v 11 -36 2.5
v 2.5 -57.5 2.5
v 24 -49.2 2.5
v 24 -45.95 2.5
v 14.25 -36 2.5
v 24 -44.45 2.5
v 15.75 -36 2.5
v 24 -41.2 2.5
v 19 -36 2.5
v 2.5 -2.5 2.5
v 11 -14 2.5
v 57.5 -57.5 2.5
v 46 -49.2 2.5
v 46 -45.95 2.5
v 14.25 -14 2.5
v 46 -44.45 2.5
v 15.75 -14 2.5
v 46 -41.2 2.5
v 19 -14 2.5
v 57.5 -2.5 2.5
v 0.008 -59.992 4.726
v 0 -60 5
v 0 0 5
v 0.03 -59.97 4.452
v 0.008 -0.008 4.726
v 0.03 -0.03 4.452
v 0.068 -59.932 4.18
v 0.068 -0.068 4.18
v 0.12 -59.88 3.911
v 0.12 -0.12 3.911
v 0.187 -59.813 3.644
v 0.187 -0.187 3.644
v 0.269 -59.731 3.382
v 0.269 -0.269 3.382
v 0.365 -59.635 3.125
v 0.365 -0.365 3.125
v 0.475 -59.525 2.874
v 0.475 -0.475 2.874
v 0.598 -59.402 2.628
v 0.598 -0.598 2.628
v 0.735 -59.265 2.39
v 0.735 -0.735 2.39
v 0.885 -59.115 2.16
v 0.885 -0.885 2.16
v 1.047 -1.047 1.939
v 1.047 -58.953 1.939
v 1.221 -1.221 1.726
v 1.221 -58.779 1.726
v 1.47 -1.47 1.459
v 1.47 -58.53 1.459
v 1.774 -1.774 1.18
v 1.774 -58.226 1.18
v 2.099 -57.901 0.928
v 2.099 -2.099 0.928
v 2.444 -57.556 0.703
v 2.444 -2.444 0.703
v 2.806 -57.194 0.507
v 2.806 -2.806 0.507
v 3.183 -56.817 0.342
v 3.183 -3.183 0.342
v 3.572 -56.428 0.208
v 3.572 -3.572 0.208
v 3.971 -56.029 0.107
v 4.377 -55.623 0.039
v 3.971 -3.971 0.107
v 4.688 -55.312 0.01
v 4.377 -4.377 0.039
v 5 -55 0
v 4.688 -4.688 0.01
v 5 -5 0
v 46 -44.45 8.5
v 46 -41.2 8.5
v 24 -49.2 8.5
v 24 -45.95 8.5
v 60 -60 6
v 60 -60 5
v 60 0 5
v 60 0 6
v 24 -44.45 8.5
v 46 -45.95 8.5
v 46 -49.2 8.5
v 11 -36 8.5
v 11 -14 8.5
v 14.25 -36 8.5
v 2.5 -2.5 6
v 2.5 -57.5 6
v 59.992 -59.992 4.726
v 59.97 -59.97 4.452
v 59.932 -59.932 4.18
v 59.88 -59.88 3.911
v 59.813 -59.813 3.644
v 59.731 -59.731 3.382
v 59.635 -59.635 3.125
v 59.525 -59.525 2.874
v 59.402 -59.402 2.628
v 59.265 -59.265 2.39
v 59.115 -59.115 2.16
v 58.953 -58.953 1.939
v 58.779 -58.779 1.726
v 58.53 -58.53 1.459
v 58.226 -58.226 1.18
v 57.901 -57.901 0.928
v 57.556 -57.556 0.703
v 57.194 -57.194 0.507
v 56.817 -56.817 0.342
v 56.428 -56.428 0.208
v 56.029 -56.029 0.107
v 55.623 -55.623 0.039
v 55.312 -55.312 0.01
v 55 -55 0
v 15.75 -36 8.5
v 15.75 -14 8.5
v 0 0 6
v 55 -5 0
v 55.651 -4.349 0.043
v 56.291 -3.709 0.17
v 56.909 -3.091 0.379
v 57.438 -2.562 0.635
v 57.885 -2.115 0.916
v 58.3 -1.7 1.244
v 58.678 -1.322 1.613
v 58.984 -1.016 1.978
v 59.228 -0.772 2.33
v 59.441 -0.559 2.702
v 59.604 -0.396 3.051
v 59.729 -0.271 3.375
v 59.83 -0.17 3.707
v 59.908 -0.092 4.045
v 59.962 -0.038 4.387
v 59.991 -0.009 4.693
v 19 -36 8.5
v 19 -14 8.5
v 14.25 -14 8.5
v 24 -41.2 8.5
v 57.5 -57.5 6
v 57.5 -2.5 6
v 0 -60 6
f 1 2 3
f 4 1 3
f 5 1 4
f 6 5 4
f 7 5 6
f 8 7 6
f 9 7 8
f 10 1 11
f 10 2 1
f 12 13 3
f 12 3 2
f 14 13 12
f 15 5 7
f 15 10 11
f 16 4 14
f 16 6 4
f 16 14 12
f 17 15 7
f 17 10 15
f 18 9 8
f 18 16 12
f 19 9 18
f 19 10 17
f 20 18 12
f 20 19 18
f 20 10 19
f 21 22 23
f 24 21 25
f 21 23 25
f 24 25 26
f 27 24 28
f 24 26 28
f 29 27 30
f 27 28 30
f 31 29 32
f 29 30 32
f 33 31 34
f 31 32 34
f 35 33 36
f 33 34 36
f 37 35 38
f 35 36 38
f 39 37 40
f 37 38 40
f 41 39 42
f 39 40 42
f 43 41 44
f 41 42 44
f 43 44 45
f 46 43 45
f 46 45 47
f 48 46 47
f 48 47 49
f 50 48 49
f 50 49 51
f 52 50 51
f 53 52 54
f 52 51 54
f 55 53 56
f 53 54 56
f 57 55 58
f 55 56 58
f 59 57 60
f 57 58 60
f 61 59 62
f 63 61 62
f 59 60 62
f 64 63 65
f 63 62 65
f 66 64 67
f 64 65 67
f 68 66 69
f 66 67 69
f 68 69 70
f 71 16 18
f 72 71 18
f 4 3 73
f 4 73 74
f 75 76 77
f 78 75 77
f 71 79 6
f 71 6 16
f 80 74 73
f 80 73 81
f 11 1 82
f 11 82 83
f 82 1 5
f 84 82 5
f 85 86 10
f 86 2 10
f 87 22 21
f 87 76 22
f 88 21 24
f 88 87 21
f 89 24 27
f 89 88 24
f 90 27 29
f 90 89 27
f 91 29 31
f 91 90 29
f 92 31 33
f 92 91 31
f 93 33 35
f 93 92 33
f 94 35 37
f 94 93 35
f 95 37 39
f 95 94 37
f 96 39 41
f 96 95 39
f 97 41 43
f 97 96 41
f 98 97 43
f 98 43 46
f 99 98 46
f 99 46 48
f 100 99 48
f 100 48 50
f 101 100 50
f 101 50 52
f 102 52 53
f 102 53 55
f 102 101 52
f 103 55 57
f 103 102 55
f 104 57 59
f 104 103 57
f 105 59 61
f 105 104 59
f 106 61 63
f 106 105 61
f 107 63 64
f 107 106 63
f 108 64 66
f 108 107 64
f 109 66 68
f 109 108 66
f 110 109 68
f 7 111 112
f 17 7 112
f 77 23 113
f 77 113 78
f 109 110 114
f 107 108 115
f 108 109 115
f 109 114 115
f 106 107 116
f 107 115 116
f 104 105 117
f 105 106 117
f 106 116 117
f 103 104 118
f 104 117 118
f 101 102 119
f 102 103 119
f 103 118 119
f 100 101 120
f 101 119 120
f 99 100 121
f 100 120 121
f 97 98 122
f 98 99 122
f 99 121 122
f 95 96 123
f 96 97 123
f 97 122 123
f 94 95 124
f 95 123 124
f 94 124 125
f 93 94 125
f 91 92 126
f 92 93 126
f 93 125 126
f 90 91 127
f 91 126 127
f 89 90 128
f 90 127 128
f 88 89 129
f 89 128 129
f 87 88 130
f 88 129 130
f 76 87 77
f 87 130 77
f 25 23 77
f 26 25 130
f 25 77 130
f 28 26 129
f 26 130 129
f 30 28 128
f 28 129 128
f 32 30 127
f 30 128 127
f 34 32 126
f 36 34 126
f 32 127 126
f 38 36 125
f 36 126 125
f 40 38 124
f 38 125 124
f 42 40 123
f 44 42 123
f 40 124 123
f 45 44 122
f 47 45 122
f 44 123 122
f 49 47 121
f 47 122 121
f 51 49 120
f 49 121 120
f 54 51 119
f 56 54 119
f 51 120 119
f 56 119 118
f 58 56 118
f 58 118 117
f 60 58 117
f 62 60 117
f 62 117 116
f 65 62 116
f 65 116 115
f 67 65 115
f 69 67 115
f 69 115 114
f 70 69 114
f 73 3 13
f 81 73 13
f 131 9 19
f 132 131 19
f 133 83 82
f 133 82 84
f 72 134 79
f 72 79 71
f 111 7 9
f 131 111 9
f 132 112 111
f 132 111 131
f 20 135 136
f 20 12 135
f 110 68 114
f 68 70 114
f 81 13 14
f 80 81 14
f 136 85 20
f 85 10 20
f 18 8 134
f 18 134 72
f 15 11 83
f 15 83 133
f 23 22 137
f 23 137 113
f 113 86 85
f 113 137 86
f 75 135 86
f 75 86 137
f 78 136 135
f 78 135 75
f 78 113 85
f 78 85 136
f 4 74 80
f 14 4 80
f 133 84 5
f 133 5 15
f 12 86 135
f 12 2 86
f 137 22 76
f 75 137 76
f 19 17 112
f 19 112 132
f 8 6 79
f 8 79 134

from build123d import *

# Parameters (mm, degrees)
F0_W     = 60
F0_H     = 60
F1_DEPTH = 6
F2_T     = -2.5
F3_W     = 8
F3_H     = 22
F3_W_2   = 22
F3_H_2   = 8
F4_DEPTH = 6
F5_W     = 1.5
F5_H     = 22
F6_W     = 22
F6_H     = 1.5
F7_DEPTH = 6
F8_R     = 5


with BuildPart() as f1:
    # F0 (on Top) → F1 (new body)
    with BuildSketch(Plane.XY):
        with Locations((30, -30)):
            Rectangle(F0_W, F0_H)
    extrude(amount=F1_DEPTH)

    # F2
    f2_openings = [f1.faces().sort_by_distance(p)[0] for p in [
        (30, -30, 6),
    ]]
    offset(amount=F2_T, openings=f2_openings)

    # F3 (on face) → F4 (join)
    with BuildSketch(Plane.XY.offset(2.5)):
        with Locations((15, -25)):
            Rectangle(F3_W, F3_H)
        with Locations((35, -45.2)):
            Rectangle(F3_W_2, F3_H_2)
    extrude(amount=F4_DEPTH)

    # F5 (on face) + F6 (on face) → F7 (cut)
    with BuildSketch(Plane.XY.offset(8.5)):
        with Locations((15, -25)):
            Rectangle(F5_W, F5_H)
    with BuildSketch(Plane.XY.offset(8.5)):
        with Locations((35, -45.2)):
            Rectangle(F6_W, F6_H)
    extrude(amount=-F7_DEPTH, mode=Mode.SUBTRACT)

    # F8
    f8_edges = [f1.edges().sort_by_distance(p)[0] for p in [
        (30, -60, 0),
        (60, -30, 0),
        (0, -30, 0),
        (30, 0, 0),
    ]]
    fillet(f8_edges, radius=F8_R)


solid = f1.part
